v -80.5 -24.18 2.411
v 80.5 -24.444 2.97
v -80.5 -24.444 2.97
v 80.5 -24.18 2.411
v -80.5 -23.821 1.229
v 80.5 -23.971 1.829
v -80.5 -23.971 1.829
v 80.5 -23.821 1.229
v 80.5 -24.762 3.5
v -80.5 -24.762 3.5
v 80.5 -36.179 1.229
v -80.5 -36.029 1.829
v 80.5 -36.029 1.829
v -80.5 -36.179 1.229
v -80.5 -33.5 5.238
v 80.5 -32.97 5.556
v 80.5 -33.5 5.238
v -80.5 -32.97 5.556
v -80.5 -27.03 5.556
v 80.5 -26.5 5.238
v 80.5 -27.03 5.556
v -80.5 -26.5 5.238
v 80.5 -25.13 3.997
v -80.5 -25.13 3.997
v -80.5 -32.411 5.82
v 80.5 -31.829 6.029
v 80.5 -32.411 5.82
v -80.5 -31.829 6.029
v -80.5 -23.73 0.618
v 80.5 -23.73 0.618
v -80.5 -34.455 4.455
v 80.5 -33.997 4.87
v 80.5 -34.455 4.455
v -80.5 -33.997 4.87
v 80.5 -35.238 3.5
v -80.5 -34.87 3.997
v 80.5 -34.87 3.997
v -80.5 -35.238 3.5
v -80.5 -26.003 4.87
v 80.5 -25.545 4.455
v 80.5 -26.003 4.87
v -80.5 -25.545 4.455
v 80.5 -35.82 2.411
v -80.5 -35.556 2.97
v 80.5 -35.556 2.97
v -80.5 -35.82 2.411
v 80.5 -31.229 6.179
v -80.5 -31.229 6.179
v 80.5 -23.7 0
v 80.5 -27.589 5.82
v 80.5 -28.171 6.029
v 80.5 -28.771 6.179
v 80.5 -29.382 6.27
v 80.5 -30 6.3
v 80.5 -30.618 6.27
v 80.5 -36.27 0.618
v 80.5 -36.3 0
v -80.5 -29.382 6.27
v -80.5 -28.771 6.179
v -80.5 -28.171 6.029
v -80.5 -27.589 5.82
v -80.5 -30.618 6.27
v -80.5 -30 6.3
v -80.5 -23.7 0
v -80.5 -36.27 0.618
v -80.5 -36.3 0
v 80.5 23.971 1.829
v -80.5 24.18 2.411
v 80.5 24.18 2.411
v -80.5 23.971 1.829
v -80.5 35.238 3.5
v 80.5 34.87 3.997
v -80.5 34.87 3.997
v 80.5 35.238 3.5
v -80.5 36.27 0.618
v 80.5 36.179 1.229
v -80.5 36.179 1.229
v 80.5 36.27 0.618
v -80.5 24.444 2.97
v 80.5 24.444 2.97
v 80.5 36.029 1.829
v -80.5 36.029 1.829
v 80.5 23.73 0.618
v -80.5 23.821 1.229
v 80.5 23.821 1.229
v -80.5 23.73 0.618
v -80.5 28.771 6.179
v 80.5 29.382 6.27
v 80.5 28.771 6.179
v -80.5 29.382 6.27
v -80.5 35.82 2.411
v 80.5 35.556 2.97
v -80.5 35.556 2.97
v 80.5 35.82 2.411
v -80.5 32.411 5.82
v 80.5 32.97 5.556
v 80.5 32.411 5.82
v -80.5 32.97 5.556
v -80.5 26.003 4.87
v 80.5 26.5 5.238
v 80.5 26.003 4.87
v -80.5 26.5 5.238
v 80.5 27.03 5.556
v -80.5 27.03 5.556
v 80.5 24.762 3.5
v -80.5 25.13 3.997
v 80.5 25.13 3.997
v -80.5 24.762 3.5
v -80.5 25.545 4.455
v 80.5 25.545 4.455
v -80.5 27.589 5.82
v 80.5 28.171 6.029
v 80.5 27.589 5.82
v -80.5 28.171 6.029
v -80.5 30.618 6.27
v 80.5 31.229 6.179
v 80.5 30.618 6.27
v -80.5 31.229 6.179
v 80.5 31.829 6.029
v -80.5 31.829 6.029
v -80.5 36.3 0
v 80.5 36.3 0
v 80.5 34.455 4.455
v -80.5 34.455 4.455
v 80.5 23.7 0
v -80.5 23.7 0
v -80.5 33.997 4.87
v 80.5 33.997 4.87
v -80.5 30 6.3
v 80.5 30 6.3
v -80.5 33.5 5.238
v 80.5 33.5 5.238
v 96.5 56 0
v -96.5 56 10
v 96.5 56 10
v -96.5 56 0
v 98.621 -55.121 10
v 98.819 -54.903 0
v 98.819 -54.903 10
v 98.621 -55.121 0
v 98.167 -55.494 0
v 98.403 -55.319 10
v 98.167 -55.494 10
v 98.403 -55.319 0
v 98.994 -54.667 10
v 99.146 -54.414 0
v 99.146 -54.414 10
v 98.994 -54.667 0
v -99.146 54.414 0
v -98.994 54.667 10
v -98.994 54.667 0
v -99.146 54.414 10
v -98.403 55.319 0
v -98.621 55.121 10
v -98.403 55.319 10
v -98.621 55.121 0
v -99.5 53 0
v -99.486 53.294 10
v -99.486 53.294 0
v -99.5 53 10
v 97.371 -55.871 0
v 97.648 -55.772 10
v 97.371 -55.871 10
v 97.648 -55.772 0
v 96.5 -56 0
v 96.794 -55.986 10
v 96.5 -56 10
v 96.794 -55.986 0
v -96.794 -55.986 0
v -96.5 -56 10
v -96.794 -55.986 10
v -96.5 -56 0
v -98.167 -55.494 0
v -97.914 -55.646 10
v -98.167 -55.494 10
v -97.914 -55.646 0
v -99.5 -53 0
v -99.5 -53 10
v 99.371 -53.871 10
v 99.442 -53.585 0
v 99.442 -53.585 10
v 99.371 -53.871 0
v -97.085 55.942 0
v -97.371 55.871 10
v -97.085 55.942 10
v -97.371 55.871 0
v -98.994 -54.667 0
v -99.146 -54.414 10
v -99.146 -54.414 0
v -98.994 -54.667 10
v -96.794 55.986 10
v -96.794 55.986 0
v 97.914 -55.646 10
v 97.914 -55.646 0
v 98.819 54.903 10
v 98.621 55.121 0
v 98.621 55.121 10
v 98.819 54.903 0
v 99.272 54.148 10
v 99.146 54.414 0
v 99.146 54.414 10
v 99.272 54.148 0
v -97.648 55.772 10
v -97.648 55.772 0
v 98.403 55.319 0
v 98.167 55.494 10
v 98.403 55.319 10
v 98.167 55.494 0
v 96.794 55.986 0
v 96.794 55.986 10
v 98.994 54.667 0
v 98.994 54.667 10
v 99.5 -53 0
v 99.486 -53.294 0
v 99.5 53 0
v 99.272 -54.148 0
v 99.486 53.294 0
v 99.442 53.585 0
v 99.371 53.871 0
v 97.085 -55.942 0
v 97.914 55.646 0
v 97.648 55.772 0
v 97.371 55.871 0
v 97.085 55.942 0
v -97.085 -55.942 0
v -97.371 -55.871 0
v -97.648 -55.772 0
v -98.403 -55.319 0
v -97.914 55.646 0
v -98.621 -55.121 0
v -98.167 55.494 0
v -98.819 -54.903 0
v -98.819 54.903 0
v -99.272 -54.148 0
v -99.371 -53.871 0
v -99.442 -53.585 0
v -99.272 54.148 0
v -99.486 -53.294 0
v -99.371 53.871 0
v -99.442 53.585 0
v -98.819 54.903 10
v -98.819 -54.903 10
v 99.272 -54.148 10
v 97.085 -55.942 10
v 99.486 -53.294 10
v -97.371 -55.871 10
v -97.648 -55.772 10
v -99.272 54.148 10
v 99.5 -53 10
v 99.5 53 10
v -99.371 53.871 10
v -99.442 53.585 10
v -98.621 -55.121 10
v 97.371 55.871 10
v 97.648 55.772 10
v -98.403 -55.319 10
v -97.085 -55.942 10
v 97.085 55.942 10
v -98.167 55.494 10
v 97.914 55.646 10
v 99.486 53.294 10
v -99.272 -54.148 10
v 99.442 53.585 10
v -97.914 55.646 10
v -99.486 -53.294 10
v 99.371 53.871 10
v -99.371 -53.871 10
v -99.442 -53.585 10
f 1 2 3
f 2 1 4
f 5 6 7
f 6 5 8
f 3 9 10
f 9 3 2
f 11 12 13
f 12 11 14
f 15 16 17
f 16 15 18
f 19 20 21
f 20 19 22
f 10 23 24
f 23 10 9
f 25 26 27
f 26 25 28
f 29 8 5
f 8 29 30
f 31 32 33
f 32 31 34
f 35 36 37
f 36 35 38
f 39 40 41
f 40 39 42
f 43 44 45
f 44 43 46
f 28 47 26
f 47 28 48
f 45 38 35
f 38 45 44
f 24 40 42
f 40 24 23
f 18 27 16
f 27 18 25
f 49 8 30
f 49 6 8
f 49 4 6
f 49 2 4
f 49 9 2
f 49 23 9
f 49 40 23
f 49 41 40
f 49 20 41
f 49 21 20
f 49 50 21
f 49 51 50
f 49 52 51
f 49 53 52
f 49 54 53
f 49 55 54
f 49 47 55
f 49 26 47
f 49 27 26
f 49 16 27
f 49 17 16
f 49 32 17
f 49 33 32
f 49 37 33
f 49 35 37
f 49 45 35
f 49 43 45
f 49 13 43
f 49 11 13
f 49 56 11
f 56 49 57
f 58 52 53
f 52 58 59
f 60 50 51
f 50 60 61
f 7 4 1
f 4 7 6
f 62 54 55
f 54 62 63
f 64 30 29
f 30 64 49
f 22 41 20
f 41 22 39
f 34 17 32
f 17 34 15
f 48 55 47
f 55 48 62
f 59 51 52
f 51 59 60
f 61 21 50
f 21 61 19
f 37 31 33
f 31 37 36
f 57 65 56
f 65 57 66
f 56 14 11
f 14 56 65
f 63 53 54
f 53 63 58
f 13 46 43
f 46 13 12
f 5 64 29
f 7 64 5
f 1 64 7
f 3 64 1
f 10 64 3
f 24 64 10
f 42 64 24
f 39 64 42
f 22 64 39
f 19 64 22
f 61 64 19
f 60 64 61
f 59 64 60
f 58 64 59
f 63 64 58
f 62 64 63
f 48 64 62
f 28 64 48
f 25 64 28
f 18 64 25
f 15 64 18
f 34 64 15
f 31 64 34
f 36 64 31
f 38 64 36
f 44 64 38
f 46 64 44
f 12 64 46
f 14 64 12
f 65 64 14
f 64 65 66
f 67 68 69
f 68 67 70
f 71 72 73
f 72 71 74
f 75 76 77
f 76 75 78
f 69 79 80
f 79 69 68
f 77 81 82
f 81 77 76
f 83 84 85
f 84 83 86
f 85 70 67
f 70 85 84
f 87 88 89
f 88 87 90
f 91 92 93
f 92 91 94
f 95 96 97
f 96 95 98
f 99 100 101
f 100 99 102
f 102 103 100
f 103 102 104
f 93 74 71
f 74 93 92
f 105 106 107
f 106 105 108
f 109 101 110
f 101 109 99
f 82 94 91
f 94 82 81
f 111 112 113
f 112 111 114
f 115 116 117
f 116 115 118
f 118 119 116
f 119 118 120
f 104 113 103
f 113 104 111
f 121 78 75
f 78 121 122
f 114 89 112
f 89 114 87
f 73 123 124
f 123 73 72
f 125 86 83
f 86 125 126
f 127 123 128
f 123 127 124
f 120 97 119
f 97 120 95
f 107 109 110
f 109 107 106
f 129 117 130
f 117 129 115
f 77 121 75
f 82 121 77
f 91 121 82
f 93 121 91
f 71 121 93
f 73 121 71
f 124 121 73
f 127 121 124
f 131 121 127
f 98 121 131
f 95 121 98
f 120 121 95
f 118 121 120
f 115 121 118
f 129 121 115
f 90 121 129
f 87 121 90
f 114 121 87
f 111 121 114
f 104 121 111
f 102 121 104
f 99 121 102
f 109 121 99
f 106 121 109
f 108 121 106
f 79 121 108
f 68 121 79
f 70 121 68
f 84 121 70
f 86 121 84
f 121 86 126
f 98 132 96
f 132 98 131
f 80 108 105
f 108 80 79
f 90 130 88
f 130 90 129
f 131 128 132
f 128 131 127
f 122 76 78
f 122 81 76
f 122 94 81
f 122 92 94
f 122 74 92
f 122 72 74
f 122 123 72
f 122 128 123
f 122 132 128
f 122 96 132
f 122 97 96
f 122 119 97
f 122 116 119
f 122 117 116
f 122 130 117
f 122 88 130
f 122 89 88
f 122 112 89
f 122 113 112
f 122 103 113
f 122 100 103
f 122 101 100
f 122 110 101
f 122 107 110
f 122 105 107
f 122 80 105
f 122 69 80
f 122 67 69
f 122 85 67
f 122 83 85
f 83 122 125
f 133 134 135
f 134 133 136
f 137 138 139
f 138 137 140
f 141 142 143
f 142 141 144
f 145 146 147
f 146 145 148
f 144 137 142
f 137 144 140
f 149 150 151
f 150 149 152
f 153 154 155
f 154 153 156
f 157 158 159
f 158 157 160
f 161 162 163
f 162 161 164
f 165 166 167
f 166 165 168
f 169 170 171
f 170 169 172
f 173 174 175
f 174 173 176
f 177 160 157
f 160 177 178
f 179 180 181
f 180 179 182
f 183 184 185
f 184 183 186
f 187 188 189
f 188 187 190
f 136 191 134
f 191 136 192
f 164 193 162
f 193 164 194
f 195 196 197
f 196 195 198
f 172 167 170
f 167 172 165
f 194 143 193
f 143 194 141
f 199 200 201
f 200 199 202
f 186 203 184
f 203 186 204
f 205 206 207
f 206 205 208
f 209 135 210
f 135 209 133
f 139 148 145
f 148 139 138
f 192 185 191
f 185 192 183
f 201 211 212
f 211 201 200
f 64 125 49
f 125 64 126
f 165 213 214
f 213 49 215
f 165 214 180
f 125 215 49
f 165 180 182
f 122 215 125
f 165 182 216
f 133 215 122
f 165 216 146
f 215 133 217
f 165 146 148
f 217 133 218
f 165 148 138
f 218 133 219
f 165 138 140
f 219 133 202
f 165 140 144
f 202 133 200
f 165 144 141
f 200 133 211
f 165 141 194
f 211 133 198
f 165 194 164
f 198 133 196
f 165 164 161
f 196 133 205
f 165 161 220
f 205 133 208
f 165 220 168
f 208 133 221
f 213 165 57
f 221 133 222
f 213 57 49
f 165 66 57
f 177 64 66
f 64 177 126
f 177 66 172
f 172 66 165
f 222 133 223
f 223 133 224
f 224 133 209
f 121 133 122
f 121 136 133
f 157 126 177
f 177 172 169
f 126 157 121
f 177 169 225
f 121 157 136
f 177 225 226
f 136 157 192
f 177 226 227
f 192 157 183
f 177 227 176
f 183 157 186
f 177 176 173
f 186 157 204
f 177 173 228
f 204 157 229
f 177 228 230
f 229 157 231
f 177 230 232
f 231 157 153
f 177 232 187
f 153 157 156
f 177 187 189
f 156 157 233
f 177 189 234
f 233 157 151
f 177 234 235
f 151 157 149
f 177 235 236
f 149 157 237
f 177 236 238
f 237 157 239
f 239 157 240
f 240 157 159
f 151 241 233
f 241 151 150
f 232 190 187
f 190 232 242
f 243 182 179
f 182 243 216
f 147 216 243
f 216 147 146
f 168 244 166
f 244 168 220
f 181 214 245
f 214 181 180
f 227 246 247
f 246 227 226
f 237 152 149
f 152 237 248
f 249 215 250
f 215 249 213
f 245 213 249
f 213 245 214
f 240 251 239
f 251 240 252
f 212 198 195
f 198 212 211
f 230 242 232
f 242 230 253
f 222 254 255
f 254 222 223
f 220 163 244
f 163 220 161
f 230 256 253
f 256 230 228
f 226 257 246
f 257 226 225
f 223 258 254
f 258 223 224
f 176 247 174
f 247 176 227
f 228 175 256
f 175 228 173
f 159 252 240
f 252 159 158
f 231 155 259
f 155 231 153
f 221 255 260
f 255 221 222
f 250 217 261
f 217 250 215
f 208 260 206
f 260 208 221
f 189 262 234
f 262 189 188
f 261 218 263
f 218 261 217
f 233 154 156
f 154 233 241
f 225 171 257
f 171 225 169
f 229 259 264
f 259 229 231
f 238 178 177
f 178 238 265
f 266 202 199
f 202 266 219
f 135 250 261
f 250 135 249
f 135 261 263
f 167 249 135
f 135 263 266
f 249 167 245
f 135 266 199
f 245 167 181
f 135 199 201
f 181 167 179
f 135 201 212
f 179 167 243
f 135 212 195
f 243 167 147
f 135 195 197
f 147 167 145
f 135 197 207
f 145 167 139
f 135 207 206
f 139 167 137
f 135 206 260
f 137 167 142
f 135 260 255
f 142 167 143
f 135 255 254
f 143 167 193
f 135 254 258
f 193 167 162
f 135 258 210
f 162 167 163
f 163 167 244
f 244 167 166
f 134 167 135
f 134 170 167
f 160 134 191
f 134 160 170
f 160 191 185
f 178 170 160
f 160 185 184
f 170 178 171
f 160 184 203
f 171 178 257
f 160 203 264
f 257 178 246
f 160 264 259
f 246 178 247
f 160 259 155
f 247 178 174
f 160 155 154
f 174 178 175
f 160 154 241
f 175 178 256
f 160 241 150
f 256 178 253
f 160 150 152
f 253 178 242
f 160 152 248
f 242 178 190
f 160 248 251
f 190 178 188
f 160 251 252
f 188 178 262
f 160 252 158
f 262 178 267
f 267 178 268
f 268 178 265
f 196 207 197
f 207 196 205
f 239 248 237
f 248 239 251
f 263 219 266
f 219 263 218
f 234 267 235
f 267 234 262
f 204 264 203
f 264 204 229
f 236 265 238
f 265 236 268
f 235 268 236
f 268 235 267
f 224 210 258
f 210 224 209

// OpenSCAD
// Locked In V2 - Curved Sidewall Attachment
// The lid has a curved underside that nests into a curved channel on the base

// Dimensions (mm)
EXTERIOR_L = 199;
EXTERIOR_W = 112;
BASE_H = 22;
LID_H = 10;
POCKET_L = 175;
POCKET_W = 88;
POCKET_D = 16;
WALL = 12;
CORNER_R = 3;

// Curved channel params
CURVE_R = 6;  // radius of the curved channel
CURVE_OFFSET = 30;  // offset from center

$fn = 64;

module rounded_box(l, w, h, r=3) {
    hull() {
        for (x = [-l/2+r, l/2-r])
        for (y = [-w/2+r, w/2-r])
            translate([x, y, 0])
                cylinder(r=r, h=h);
    }
}

module base_v2() {
    difference() {
        union() {
            // Main base body
            rounded_box(EXTERIOR_L, EXTERIOR_W, BASE_H);
            
            // Curved ridge running lengthwise on both sides
            for (y_off = [-CURVE_OFFSET, CURVE_OFFSET]) {
                translate([0, y_off, BASE_H])
                    rotate([0, 90, 0])
                        cylinder(r=CURVE_R, h=EXTERIOR_L-40, center=true);
            }
        }
        
        // Phone pocket
        translate([0, 0, BASE_H - POCKET_D])
            rounded_box(POCKET_L, POCKET_W, POCKET_D + 1, r=3.2);
    }
}

module lid_v2() {
    difference() {
        // Main lid body
        rounded_box(EXTERIOR_L, EXTERIOR_W, LID_H);
        
        // Curved grooves on bottom to match base ridges
        for (y_off = [-CURVE_OFFSET, CURVE_OFFSET]) {
            translate([0, y_off, 0])
                rotate([0, 90, 0])
                    cylinder(r=CURVE_R + 0.3, h=EXTERIOR_L-38, center=true);
        }
    }
}

// Export base
// base_v2();

// Export lid (uncomment to render)
lid_v2();
